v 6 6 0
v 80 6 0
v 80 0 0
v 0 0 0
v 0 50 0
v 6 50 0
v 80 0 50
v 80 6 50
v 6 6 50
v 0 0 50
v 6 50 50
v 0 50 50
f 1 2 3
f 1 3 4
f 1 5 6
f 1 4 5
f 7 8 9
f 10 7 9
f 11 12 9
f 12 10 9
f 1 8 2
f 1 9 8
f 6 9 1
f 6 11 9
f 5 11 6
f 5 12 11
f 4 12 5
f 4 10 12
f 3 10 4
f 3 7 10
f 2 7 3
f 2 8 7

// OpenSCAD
$fn = 32;

// ----------------------------------------------------------------------
// Structural section: angle 80 x 50 mm
// ----------------------------------------------------------------------

// --- parameters (mm) ---
sec_w = 80;               // leg width, X
sec_h = 50;               // leg height, Y
flange_t = 6;             // leg thickness
plate_t = 50;             // cut length, Z (extrusion height)
fit_tol = 0.1;            // declared fit tolerance (prompt contract)
free_tol = 0.5;           // declared free tolerance (prompt contract)

profile = [[0, 0], [80, 0], [80, 6], [6, 6], [6, 50], [0, 50]];  // primary outline, 6 points, counter clockwise

// --- the one profile operation ---
linear_extrude(height = plate_t) polygon(points = profile);
